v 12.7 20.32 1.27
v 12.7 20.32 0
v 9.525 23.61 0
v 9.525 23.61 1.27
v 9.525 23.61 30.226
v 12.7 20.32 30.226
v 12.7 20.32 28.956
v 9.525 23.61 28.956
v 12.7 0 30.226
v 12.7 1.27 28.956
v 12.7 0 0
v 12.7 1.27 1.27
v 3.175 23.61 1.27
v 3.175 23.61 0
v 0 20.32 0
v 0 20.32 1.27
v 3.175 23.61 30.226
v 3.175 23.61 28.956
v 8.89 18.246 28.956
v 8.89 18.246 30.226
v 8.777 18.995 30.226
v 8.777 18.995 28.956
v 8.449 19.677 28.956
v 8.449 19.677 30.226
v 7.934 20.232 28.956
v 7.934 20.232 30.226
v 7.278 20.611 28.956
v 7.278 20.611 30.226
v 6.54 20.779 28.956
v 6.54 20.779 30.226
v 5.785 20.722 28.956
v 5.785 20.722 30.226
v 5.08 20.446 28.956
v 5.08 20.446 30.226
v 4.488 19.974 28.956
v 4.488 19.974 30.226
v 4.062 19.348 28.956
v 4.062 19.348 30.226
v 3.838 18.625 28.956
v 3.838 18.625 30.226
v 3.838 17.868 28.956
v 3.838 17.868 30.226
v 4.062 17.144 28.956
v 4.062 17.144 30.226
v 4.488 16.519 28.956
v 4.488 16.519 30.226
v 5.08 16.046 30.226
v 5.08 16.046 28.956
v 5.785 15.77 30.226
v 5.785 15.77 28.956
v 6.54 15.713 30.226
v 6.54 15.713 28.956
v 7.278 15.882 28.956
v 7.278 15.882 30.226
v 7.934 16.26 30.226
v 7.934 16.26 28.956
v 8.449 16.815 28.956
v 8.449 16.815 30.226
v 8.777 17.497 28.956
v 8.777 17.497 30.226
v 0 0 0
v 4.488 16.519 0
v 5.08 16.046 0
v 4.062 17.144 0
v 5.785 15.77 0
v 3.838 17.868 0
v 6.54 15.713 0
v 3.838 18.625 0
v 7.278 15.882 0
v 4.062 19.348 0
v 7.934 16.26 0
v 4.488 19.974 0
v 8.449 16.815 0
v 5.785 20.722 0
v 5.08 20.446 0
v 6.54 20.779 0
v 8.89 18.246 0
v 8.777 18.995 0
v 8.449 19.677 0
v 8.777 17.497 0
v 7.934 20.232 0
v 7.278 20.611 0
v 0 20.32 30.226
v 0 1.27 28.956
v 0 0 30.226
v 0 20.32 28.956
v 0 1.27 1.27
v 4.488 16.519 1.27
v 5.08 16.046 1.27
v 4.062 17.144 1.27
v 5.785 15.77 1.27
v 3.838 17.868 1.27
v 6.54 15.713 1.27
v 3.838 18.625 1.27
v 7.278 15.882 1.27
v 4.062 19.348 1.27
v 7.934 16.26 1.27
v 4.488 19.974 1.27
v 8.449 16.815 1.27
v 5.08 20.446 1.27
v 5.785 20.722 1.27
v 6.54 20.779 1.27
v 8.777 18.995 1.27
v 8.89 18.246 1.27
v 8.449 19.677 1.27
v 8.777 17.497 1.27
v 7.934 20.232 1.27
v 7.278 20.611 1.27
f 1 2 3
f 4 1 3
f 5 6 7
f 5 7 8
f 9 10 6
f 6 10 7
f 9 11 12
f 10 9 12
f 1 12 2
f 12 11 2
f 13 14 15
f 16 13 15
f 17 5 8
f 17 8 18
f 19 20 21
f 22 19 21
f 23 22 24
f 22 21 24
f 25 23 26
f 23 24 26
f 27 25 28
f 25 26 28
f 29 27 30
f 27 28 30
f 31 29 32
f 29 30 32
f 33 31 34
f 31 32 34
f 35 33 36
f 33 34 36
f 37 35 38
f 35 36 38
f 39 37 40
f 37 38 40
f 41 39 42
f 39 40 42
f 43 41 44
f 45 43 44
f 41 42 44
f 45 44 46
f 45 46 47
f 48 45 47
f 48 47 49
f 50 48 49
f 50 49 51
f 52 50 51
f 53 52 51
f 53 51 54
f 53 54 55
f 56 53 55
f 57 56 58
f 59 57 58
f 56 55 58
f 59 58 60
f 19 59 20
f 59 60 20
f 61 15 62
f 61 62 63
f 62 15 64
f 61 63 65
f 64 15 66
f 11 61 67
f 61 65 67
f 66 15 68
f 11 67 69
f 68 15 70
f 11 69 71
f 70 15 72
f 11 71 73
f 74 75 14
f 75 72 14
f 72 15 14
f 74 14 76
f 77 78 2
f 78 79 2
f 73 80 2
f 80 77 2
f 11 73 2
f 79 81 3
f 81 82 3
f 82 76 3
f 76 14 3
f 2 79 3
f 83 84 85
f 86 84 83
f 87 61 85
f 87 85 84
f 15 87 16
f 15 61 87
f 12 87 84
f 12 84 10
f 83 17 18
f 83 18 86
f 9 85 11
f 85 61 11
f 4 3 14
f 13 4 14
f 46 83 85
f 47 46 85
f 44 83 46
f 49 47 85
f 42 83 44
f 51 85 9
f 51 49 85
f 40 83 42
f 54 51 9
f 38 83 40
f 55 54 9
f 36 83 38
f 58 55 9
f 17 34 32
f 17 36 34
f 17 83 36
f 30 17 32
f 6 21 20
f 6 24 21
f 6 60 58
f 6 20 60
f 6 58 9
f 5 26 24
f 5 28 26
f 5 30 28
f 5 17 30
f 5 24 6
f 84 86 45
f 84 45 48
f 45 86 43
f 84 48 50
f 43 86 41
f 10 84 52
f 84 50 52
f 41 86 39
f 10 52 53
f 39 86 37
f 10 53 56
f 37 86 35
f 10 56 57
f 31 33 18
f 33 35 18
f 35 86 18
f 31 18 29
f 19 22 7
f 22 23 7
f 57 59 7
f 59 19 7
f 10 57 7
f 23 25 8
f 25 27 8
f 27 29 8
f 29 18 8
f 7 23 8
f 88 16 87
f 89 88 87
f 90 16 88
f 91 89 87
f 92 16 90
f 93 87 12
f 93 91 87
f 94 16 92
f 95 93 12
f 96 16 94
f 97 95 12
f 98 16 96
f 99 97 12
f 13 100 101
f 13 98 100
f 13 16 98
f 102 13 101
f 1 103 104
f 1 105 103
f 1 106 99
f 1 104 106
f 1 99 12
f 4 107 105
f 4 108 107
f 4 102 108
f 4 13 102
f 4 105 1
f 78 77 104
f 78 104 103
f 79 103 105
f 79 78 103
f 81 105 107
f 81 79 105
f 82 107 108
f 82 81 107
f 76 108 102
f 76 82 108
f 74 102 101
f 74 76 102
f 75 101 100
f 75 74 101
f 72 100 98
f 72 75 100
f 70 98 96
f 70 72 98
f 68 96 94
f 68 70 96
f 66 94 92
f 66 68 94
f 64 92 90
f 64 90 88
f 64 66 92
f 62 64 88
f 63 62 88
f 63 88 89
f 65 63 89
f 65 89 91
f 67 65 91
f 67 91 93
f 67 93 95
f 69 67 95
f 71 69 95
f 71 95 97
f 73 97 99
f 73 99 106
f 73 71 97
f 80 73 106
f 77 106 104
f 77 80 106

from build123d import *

# Parameters (mm, degrees)
SKETCH4_R           = 2.54
BOSS_EXTRUDE1_DEPTH = 1.27
SKETCH5_W           = 12.7
SKETCH5_H           = 1.27
BOSS_EXTRUDE2_DEPTH = 28.956


with BuildPart() as part:
    # Sketch4 → Boss-Extrude1 (new body)
    with BuildSketch(Plane.XY):
        Polygon((0, 0), (12.7, 0), (12.7, 20.32), (9.525, 23.609765797), (3.175, 23.609765797), (0, 20.32), align=None)
        with Locations((6.35, 18.246144904)):
            Circle(SKETCH4_R, mode=Mode.SUBTRACT)
    boss_extrude1 = extrude(amount=BOSS_EXTRUDE1_DEPTH)

    # Sketch5 → Boss-Extrude2 (add)
    with BuildSketch(Plane.XY.offset(1.27)):
        with Locations((6.35, 0.635)):
            Rectangle(SKETCH5_W, SKETCH5_H)
    extrude(amount=BOSS_EXTRUDE2_DEPTH)

    # Mirror1: Boss-Extrude1 across plane
    add(boss_extrude1.mirror(Plane.XY.offset(15.113)))


solid = part.part
